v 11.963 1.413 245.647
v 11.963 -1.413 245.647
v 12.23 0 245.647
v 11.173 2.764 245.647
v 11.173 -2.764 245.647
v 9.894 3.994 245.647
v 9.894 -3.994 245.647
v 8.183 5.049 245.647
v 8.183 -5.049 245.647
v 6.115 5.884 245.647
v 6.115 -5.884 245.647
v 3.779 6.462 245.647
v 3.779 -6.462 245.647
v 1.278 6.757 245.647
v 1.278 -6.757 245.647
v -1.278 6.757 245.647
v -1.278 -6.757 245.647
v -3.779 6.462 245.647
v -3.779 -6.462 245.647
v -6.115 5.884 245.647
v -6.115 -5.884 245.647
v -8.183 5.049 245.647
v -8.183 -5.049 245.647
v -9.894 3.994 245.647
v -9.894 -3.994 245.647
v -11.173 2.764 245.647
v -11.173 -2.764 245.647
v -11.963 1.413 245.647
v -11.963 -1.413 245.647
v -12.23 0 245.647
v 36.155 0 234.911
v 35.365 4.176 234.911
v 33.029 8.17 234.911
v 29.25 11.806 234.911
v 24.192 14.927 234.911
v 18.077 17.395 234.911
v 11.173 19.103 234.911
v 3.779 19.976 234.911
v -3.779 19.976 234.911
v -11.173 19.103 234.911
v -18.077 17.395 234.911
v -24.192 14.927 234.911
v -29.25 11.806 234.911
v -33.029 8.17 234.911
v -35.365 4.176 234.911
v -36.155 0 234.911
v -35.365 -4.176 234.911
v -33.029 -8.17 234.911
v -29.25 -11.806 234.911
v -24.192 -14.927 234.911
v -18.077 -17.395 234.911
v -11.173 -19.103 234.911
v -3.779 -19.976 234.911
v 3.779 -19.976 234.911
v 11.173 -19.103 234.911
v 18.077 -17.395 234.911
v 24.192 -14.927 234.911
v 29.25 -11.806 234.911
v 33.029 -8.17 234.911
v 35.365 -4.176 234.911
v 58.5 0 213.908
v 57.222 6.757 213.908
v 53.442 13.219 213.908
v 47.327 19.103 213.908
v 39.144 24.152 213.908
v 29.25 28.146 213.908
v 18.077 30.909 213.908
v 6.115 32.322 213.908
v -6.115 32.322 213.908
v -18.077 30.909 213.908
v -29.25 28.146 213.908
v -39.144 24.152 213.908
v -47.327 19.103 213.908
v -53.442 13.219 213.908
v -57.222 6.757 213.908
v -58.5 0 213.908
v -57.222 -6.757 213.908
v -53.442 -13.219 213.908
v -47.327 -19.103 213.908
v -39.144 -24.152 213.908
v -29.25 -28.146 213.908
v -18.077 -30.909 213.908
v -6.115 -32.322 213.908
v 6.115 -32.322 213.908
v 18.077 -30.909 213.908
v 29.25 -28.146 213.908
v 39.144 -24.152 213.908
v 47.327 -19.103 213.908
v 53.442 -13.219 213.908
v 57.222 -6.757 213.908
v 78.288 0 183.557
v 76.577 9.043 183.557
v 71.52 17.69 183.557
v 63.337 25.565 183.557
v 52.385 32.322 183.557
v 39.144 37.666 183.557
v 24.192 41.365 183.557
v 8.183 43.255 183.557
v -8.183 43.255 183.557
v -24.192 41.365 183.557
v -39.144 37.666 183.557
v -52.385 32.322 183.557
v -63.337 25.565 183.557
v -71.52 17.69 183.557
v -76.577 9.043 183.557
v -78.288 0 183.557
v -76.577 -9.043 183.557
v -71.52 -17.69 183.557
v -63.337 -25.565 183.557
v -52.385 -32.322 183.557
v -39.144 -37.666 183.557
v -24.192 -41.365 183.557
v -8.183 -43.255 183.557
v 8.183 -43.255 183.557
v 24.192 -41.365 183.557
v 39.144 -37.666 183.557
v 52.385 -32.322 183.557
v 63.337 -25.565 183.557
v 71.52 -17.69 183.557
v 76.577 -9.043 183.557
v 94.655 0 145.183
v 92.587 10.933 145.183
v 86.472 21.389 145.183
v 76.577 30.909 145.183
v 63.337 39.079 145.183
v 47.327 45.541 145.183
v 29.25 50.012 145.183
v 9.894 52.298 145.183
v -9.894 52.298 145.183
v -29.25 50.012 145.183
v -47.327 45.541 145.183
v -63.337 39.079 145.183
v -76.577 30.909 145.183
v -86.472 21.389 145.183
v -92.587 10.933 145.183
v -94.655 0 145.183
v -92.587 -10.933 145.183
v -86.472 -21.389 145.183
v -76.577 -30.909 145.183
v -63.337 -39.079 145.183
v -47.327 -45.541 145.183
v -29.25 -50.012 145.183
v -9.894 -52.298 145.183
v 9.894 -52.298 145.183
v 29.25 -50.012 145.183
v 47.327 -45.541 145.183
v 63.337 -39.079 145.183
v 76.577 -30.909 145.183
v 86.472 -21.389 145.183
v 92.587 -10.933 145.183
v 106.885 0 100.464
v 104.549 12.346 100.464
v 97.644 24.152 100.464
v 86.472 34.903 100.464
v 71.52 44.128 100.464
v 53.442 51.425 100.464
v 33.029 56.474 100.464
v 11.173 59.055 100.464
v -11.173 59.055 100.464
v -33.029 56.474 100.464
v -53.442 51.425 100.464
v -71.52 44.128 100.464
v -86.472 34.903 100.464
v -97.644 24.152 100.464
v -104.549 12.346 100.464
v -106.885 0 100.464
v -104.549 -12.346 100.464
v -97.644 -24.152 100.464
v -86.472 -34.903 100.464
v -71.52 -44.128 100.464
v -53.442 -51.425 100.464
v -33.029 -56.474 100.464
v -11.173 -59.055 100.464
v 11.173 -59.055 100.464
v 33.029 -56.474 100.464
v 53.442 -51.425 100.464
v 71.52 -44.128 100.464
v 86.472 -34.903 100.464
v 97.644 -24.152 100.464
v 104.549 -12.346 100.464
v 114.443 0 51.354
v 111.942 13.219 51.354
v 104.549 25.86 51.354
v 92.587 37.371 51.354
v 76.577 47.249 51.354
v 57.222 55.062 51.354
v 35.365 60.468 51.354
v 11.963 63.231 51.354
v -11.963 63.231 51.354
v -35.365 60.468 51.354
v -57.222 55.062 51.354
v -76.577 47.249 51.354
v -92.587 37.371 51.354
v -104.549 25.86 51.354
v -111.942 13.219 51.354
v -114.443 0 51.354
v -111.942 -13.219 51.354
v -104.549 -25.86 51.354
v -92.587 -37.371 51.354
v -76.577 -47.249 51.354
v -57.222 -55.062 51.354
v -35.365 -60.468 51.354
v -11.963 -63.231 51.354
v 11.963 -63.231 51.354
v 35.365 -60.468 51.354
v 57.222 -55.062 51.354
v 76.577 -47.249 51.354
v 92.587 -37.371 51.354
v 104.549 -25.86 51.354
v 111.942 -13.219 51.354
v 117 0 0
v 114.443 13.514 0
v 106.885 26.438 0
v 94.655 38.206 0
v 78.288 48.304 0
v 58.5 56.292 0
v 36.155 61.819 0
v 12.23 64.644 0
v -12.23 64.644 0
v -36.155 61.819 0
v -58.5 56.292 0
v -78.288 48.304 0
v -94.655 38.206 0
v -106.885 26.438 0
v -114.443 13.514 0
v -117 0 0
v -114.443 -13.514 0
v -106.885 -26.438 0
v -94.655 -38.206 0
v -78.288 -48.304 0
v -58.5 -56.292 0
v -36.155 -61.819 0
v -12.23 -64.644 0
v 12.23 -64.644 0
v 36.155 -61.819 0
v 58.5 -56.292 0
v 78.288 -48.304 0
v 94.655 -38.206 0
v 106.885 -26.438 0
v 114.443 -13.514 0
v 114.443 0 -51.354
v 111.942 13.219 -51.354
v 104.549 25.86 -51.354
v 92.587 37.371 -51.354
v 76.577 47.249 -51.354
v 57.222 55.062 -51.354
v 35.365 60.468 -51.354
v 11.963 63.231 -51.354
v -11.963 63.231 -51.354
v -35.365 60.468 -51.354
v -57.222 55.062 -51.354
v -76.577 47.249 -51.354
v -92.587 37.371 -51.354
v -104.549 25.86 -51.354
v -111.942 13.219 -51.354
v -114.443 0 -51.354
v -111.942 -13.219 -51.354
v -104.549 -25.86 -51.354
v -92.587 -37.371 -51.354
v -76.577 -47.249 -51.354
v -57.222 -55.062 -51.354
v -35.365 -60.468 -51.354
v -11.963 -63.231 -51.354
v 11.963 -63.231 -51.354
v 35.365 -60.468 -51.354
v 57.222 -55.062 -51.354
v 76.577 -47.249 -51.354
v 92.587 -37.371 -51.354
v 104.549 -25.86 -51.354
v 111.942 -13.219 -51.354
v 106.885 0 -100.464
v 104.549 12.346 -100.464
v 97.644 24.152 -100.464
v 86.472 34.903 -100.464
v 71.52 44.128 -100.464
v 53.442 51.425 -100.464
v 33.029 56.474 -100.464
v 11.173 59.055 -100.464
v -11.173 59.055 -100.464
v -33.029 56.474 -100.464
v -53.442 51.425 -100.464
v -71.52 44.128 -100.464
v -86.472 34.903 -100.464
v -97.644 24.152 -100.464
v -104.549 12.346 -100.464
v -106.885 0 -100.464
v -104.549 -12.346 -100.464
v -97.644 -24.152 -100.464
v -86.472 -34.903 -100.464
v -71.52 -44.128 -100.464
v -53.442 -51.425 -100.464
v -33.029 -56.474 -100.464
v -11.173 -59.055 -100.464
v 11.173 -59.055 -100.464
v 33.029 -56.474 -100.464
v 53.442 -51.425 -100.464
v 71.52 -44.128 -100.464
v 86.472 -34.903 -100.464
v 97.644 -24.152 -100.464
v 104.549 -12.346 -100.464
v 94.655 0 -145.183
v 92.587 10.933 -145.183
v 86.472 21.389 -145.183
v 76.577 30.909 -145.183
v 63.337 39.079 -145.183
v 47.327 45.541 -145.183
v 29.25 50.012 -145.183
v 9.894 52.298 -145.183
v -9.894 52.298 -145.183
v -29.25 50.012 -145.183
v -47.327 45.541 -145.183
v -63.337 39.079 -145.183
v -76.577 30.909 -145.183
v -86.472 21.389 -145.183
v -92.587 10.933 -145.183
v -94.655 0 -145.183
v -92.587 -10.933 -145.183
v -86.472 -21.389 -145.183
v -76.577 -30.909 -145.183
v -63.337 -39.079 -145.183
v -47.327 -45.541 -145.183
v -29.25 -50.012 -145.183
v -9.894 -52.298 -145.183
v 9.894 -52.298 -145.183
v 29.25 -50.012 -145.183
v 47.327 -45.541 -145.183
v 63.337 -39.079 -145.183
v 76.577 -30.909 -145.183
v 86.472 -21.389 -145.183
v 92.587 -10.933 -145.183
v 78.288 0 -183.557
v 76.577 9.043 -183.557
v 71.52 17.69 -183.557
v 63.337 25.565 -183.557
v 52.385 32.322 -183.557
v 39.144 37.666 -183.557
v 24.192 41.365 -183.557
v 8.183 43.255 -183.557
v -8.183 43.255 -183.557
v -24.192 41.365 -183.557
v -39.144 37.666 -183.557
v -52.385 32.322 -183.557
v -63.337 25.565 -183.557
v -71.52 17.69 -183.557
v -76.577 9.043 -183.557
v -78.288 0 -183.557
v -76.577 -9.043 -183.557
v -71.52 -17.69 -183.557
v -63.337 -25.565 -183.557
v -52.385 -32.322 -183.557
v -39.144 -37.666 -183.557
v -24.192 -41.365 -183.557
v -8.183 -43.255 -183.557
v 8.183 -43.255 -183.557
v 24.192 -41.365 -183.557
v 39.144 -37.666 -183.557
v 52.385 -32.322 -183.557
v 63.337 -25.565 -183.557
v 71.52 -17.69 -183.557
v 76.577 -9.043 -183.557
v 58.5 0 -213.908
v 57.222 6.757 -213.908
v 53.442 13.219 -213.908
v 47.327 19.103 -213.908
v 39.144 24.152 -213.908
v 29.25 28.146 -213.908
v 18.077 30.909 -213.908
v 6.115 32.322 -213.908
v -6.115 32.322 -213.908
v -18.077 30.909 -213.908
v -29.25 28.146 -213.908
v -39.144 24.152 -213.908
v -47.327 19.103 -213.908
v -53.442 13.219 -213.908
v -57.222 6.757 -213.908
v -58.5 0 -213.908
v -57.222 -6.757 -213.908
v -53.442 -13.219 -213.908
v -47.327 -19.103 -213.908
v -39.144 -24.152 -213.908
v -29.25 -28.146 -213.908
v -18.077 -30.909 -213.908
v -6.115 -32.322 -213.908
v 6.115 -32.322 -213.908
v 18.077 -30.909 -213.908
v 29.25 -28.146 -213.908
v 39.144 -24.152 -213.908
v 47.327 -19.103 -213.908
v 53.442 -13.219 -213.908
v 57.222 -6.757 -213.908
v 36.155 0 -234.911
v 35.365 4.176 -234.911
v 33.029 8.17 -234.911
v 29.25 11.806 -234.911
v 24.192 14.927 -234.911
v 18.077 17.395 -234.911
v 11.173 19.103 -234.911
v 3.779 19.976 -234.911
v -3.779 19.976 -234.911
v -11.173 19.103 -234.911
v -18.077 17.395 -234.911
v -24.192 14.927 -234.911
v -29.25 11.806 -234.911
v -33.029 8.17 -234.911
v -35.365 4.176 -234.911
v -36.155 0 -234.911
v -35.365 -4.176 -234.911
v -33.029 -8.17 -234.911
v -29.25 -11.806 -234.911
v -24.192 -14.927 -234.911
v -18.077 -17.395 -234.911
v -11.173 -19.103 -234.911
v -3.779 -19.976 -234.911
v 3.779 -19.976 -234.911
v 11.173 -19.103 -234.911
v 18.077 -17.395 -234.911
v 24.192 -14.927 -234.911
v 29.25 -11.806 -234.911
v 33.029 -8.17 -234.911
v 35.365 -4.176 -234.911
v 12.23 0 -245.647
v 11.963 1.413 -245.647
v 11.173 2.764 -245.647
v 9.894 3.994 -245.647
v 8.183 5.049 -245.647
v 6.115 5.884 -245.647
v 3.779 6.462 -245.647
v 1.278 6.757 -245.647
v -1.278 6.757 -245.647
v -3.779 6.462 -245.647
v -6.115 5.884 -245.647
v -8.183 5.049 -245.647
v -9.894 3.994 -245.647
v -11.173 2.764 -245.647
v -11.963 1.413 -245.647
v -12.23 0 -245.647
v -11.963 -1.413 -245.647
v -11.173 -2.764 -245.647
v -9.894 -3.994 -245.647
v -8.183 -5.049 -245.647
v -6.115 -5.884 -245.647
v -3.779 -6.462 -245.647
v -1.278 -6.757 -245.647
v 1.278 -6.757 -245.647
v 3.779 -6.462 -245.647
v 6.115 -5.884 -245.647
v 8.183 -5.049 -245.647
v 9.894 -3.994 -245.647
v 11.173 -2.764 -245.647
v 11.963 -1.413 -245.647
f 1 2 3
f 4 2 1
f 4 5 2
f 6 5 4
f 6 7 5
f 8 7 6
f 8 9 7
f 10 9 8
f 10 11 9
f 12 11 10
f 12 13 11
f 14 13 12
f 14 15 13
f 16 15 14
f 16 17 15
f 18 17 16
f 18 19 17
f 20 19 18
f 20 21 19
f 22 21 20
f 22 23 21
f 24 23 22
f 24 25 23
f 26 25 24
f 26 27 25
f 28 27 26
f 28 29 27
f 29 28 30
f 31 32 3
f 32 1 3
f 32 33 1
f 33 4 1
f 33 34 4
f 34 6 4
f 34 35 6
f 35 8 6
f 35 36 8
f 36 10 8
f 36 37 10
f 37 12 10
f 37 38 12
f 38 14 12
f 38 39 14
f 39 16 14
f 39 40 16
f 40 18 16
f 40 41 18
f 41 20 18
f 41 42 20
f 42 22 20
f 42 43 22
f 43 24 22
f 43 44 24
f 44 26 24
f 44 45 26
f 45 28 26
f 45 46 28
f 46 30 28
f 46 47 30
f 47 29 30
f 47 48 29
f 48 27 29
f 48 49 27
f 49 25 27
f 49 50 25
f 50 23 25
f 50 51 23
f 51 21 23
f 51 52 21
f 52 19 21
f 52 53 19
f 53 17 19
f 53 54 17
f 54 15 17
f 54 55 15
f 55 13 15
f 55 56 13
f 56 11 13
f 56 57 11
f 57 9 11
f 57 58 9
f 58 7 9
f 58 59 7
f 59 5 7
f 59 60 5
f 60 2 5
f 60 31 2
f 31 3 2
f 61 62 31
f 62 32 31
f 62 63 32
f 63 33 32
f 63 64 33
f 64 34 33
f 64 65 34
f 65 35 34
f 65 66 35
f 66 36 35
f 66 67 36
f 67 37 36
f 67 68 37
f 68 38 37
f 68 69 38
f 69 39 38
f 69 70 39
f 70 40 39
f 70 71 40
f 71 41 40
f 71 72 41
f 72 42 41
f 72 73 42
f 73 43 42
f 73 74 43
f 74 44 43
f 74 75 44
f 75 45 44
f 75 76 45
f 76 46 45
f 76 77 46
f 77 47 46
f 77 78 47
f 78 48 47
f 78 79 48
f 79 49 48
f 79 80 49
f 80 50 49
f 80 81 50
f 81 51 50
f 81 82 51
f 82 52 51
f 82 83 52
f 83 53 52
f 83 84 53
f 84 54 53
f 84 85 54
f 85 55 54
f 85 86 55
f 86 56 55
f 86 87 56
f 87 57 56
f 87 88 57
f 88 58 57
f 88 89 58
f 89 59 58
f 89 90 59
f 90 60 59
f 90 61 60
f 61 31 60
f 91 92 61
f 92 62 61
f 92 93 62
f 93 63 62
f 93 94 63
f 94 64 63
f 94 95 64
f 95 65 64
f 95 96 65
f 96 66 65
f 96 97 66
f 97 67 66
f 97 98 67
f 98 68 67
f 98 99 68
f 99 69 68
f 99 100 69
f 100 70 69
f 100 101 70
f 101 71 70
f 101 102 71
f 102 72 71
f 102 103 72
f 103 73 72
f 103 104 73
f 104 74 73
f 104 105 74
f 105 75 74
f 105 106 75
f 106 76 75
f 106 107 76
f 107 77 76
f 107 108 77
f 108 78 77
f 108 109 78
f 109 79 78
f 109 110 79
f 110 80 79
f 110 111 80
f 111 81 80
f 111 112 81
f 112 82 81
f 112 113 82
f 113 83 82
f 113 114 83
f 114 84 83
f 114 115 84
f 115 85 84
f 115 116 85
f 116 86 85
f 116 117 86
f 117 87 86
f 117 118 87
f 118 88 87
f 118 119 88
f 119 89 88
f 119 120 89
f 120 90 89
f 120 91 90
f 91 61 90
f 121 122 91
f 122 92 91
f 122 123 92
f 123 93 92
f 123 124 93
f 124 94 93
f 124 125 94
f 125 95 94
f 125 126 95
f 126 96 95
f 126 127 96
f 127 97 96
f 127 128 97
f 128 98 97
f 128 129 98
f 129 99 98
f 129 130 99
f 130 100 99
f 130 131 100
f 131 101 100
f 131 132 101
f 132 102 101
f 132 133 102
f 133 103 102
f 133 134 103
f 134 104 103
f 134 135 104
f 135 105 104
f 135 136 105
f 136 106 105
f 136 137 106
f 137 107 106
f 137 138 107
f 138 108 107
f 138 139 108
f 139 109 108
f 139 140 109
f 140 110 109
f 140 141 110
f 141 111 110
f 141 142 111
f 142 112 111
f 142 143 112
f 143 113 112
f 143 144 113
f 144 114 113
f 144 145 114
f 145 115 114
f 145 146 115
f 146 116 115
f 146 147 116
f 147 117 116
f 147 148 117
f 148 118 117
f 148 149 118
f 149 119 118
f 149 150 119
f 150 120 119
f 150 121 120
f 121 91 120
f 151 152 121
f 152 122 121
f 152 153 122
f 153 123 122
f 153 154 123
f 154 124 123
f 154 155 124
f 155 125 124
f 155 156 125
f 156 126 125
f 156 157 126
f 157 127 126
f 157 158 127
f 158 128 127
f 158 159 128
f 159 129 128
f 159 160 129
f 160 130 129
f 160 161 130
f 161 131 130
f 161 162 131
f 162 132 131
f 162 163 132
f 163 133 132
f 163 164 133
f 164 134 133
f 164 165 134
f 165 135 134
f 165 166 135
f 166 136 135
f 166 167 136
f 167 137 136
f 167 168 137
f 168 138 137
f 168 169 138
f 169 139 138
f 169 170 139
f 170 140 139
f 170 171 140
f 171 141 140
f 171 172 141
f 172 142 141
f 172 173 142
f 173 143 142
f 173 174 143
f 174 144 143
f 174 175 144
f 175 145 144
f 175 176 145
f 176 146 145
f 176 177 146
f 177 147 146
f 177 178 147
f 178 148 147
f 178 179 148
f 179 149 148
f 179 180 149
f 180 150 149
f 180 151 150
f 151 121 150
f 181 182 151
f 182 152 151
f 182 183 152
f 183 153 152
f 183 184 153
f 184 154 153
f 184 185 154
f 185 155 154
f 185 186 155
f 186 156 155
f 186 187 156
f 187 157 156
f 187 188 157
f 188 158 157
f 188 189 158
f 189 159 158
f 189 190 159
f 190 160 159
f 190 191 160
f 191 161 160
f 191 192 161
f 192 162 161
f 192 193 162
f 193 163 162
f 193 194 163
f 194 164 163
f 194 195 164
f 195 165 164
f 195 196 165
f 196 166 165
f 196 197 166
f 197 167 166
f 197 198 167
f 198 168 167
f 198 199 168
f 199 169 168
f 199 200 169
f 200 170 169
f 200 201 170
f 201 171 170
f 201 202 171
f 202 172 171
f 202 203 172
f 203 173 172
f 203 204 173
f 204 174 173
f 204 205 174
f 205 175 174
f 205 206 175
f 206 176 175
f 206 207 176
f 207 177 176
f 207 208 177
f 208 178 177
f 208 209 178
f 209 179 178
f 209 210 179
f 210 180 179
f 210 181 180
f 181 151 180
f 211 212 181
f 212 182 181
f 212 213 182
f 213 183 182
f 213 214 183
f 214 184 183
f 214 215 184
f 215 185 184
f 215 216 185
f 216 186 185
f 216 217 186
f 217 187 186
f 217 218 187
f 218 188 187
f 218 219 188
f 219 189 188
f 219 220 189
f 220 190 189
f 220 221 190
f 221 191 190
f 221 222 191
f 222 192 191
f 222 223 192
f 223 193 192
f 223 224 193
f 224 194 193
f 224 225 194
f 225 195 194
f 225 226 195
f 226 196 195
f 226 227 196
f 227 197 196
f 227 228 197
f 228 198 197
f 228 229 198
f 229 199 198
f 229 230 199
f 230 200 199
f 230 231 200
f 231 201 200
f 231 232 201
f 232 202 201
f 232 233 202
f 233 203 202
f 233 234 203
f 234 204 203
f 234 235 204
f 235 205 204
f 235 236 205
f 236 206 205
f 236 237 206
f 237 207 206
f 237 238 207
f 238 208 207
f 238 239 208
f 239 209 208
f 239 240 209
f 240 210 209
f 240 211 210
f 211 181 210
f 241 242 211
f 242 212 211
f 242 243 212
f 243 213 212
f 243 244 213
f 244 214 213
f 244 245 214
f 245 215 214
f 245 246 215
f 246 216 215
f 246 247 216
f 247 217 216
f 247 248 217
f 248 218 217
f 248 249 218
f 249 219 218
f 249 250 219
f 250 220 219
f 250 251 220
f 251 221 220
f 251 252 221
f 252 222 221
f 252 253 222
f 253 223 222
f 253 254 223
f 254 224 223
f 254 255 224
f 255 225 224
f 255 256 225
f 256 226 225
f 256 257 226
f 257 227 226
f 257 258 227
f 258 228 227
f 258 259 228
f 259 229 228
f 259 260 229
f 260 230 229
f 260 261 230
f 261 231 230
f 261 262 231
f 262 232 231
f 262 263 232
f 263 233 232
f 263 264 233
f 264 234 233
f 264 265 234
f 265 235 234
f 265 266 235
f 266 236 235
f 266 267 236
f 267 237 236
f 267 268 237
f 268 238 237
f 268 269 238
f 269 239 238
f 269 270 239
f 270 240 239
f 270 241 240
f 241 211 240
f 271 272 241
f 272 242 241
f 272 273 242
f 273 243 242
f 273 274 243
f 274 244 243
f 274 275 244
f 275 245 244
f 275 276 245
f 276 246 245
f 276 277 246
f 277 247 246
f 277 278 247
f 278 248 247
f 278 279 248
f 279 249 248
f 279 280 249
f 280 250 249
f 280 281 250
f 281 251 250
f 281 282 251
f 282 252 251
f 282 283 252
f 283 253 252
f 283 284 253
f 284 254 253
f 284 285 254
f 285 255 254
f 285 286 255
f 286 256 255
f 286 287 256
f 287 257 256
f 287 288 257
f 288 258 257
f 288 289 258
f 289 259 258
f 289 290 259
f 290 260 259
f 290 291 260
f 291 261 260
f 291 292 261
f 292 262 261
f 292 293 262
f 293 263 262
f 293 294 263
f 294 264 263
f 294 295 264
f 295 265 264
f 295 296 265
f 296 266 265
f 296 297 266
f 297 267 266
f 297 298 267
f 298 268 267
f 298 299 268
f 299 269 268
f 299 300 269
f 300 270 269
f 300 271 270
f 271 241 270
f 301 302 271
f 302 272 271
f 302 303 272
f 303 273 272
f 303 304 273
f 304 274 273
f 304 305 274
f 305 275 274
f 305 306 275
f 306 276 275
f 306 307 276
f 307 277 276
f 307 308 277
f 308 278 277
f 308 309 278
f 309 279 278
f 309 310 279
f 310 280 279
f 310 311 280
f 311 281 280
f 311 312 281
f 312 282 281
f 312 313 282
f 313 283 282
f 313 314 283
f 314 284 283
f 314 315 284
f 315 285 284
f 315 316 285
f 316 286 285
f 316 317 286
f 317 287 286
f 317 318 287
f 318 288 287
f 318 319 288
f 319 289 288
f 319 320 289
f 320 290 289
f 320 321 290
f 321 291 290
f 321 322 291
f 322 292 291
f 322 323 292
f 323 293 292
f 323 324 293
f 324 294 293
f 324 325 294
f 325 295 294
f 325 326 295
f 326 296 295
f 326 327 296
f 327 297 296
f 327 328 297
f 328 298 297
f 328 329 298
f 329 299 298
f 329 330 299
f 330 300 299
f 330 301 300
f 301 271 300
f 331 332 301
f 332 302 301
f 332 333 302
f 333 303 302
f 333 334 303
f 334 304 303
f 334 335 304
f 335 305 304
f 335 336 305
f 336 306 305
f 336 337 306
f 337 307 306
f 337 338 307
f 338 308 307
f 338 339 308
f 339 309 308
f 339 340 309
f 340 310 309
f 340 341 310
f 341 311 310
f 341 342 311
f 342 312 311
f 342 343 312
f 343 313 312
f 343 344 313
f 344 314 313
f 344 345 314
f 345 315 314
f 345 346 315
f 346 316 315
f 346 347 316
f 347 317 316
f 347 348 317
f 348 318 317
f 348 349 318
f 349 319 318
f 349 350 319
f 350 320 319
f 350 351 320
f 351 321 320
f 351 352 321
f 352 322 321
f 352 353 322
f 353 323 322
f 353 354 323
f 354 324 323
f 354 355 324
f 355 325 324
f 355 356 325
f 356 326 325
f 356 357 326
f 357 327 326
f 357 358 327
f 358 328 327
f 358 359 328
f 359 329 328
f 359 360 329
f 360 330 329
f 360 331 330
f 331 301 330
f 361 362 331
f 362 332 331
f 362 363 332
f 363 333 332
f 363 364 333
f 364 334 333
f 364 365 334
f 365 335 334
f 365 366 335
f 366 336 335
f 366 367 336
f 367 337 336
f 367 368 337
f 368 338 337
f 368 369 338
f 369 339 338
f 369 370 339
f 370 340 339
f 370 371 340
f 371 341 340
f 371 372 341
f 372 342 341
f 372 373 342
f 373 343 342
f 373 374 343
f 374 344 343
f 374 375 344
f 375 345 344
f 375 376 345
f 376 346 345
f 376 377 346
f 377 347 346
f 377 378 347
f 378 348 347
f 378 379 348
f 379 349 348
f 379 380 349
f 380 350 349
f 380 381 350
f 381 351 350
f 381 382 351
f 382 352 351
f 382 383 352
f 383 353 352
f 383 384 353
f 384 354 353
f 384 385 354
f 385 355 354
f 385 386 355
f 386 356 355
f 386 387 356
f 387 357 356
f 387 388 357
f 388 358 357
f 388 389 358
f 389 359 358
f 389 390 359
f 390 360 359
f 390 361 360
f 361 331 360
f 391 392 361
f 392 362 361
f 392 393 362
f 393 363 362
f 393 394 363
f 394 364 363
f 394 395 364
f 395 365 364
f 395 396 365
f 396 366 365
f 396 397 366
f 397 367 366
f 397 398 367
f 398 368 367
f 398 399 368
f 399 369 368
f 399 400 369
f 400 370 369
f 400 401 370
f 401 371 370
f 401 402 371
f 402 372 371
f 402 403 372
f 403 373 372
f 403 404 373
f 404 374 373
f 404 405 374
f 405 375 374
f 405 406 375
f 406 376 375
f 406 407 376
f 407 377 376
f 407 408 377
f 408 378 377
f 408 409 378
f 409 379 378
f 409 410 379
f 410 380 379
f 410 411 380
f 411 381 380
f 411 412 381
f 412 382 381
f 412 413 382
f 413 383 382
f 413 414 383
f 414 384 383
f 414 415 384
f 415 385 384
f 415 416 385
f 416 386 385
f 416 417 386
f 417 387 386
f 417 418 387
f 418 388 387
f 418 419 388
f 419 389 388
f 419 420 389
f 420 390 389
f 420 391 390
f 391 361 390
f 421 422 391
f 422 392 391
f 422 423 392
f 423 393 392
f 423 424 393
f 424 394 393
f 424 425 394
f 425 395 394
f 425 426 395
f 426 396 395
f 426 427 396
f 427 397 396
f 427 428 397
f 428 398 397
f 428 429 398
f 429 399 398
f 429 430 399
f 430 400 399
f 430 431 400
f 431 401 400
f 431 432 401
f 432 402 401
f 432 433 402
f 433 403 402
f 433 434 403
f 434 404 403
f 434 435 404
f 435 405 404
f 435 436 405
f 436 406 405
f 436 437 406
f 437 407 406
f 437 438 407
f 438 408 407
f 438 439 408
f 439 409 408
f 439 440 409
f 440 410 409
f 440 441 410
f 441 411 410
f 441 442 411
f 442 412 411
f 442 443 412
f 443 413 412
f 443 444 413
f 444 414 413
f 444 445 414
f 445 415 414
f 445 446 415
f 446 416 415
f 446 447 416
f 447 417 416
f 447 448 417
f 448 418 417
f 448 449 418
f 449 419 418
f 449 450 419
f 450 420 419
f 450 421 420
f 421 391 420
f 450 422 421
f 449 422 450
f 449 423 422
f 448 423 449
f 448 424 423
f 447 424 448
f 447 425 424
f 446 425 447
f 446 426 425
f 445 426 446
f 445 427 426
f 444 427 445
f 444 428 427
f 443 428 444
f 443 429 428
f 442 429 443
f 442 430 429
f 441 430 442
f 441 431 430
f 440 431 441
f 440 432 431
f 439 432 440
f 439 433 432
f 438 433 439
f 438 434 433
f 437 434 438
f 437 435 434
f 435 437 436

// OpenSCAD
// Generated by SolidPython 1.0.1 on 2020-07-29 00:46:48


scale(v = [9, 5, 19]) {
	sphere(r = 13);
}
/***********************************************
*********      SolidPython code:      **********
************************************************
 
# import packages: SolidPython
from solid import *
from solid.utils import *
from itertools import chain, combinations, permutations


class Resize:

    def __init__(self, scad_file):
        self.scad_file = scad_file
        #self.scad_file = import_scad(scad_file)
        # cone/cylinder param:
        self.r1 = 0
        self.r2 = 0
        self.h = 0
        # rectangular prism param:
        self.w = 0
        self.l = 0
        # ellipse param:
        self.r = 0

    # import OpenScad code (file name corresponds to shape)


    # classify shape + parameters
    def assign(self, param1, param2, param3):
        if self.scad_file == 'cone.scad':
            self.r1 = param1
            self.r2 = param2
            self.h = param3
        elif self.scad_file == 'cylinder.scad':
            self.r1 = param1
            self.r2 = param2
            self.h = param3
        elif self.scad_file == 'rectangularPrism.scad':
            self.h = param1
            self.l = param2
            self.w = param3
        else:
            self.r = param1
            self.h = param2

    # resize parameters
    def iterate(self):
        x = range(3, 20, 2)
        i = 1
        if self.scad_file == 'cone.scad':
            tempList = list(permutations(x, 2))
            for temp in tempList:
                param1 = temp[0]
                param2 = temp[1]
                filepath = 'produced_scad_files/' + 'cone' + str(param1) + '_' + str(param2) + '_' + '.scad'
                scad_render_to_file(cylinder(h=param1, r1=param2, r2=0), filepath)

        elif self.scad_file == 'cylinder.scad':
            tempList = list(permutations(x, 3))
            for temp in tempList:
                param1 = temp[0]
                param2 = temp[1]
                filepath = 'produced_scad_files/' + 'cylinder' + str(param1) + '_' + str(param2) + '_' + '.scad'
                scad_render_to_file(cylinder(h=param1, r1=param2, r2=param2), filepath)

        elif self.scad_file == 'rectangularPrism.scad':
            tempList = list(permutations(x, 3))
            for temp in tempList:
                param1 = temp[0]
                param2 = temp[1]
                param3 = temp[2]
                filepath = 'produced_scad_files/' + 'rectangularPrism' + str(param1) + '_' + str(param2) + '_' + str(
                    param3) + '.scad'
                scad_render_to_file(cube(size=(param1, param2, param3)), filepath)

        elif self.scad_file == 'ellipse.scad':
            tempList = list(permutations(x, 4))
            for temp in tempList:
                param1 = temp[0]
                param2 = temp[1]
                param3 = temp[2]
                param4 = temp[3]
                filepath = 'produced_scad_files/' + 'ellipse' + str(param1) + '_' + str(param2) + '_' + str(param3) + '_' + str(param4) + '.scad'
                scad_render_to_file(scale([param1, param2, param3])(sphere(r=param4)), filepath)

    def render_to_scadfile(self):
        scad_render_to_file(scad, 'example.scad') 
 
************************************************/
